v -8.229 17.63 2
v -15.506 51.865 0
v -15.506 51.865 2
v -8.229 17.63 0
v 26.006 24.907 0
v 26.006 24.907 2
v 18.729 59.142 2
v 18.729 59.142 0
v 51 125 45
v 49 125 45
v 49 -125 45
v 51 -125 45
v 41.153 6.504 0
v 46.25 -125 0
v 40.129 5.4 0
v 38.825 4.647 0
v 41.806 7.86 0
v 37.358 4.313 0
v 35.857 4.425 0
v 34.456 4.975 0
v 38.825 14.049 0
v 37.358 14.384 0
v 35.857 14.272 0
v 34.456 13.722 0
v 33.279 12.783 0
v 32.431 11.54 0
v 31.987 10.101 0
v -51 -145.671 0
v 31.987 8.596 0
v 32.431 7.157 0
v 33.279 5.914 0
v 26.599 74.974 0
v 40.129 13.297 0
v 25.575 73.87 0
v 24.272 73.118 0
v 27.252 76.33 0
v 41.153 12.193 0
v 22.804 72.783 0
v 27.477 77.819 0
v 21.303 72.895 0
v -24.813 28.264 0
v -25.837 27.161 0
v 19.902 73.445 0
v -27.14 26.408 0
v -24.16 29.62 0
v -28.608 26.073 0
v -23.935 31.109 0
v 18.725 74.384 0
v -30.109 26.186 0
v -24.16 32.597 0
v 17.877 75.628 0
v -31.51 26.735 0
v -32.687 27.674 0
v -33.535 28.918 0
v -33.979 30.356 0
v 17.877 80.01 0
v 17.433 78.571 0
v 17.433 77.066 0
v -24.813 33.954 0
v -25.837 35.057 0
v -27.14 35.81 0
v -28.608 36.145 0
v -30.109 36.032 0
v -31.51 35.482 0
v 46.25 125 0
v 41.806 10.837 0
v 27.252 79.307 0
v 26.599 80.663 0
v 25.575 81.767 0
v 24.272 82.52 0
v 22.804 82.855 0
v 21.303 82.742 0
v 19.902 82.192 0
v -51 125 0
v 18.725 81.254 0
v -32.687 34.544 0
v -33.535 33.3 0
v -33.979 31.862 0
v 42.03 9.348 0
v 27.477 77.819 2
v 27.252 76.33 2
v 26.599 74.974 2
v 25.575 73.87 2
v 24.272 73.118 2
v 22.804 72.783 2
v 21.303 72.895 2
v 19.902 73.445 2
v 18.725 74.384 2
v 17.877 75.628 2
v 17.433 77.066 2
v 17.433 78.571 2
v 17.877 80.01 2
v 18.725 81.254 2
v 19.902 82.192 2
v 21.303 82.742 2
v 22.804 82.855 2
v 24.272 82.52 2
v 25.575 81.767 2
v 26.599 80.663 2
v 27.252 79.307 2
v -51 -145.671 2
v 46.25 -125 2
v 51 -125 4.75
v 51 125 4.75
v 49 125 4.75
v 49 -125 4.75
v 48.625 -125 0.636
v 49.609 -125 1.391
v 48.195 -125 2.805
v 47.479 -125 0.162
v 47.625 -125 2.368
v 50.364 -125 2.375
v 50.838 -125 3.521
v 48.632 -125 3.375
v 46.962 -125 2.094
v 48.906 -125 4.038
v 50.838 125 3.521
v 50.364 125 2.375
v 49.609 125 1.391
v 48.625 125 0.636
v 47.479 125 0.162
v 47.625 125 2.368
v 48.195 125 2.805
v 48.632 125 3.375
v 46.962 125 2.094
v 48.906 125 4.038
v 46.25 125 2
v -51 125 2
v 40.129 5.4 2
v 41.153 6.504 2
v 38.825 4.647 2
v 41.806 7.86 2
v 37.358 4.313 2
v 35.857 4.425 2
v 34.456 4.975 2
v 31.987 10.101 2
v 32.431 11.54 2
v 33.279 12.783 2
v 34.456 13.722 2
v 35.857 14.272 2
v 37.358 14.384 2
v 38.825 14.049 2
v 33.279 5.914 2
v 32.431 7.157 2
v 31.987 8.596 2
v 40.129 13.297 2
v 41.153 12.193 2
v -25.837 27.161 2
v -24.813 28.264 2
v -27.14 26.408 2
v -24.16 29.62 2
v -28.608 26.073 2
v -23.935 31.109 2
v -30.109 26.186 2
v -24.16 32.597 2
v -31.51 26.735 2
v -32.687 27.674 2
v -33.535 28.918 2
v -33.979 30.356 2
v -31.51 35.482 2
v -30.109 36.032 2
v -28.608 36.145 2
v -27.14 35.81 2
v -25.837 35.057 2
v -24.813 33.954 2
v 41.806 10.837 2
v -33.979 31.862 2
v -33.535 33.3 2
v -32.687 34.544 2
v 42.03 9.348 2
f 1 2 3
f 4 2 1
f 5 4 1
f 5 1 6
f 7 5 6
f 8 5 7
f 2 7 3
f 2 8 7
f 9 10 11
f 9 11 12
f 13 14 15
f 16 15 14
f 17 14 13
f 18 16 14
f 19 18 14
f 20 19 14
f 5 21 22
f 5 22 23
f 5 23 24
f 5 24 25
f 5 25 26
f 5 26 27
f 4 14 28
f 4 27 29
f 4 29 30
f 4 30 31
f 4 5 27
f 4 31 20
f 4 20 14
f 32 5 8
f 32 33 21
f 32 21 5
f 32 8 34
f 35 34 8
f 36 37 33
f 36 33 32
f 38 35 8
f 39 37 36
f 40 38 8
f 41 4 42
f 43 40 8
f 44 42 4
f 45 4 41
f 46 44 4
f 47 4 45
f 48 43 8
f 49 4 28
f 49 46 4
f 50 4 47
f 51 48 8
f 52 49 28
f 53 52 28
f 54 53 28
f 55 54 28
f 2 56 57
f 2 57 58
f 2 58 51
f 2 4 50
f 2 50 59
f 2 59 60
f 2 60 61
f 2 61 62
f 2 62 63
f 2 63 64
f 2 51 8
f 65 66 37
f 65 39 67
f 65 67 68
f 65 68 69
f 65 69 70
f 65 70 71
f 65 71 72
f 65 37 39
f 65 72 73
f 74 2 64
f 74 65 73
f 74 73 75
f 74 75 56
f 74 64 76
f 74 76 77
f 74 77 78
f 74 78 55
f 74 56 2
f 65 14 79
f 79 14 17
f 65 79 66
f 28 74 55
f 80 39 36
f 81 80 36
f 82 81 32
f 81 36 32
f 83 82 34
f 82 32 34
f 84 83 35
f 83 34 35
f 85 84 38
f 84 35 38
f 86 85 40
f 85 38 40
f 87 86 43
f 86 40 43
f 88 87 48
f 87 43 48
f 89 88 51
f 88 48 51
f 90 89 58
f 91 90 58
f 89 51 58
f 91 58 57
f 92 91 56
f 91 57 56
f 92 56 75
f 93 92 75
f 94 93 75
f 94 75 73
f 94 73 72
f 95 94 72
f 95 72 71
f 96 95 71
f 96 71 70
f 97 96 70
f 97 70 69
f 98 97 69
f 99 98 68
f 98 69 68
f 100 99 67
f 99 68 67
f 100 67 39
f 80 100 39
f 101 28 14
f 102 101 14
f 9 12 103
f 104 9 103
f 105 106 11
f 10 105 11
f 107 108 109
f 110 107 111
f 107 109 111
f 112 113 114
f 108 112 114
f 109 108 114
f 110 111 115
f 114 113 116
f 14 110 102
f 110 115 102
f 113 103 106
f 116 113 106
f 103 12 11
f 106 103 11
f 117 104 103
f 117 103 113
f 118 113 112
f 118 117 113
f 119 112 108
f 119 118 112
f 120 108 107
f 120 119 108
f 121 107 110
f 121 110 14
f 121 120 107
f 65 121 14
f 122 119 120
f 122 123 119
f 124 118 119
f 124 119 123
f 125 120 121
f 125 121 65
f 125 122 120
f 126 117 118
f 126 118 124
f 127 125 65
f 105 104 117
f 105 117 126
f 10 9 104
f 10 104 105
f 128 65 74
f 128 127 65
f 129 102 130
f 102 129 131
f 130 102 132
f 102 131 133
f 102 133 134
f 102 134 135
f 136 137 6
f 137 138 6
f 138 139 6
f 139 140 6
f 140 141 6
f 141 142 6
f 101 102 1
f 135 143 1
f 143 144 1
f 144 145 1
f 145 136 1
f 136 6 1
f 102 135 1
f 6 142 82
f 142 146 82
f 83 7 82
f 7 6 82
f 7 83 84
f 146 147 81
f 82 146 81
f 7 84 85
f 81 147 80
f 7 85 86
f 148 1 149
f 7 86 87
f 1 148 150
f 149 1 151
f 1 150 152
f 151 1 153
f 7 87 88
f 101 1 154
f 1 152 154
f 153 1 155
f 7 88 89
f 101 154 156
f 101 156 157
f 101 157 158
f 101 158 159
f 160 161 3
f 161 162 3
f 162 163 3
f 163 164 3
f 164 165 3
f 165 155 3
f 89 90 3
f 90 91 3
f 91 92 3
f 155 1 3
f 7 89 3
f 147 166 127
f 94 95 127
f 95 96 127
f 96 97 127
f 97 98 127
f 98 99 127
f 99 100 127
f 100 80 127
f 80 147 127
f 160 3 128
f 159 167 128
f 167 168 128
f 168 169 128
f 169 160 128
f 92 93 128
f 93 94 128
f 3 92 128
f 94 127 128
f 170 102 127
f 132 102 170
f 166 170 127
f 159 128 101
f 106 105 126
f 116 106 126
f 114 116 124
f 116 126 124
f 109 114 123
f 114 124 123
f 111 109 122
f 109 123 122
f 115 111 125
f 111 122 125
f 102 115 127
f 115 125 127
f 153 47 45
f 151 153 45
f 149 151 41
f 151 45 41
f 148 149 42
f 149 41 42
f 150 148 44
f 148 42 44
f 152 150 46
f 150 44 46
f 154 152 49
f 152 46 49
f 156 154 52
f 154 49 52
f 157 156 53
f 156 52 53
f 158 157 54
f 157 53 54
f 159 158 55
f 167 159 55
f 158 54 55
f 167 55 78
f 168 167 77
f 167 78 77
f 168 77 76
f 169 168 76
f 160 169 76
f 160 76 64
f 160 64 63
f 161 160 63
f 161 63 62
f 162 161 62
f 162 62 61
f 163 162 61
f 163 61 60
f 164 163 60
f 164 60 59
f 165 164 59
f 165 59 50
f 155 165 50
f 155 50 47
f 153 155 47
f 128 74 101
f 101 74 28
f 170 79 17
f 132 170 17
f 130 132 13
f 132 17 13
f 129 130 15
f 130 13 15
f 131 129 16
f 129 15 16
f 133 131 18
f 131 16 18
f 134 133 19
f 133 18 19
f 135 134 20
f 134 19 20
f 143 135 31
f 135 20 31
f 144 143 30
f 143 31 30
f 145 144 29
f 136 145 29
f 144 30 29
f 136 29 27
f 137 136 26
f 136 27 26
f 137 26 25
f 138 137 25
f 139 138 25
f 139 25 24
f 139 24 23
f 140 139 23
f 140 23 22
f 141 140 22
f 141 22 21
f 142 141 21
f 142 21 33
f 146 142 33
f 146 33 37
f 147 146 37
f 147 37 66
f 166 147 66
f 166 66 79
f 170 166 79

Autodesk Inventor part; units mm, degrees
ref_plane "YZ Plane" through (0, 0, 0) normal (1, 0, 0) x (0, 1, 0)
ref_plane "XZ Plane" through (0, 0, 0) normal (0, 1, 0) x (-1, 0, 0)
ref_plane "XY Plane" through (0, 0, 0) normal (0, 0, 1) x (1, 0, 0)
sketch "Sketch1" plane through (0, 0, 0) normal (0, 0, 1) x (1, 0, 0)
  line L0 (-51, 125) -> (51, 125)
  line L1 (51, 125) -> (51, -125)
  line L2 (51, -125) -> (-51, -125)
  line L3 (-51, -125) -> (-51, 125)
  line L4 (-51, 125) -> (51, -125) construction
  point P0 (0, 0)
  point P1 (0, 0)
  dimension "d0" = 102
  dimension "d1" = 250
extrude "Plate1" add sketch "Sketch1" along normal blind 2
sketch "Sketch4" plane through (49, 125, 0) normal (1, 0, 0) x (0, 1, 0)
  line L0 (-250, 0) -> (0, 0)
  line L1 (0, 0) -> (0, 45)
  line L2 (0, 45) -> (-250, 45)
  line L3 (-250, 45) -> (-250, 0)
edge flange "Flange1" height 45 angle 90 thickness 2 bend radius 2.75 thickness toward (1, 0, 0) relief round relief width 2 relief depth 1 edges at (51, 0, 2) wall of the first edge with corners at (49, -125, 0) (49, 125, 0) (49, 125, 45) (49, -125, 45)
bend "Bend1"
corner "Corner1"
sketch "Sketch5" plane through (0, 0, 0) normal (0, 0, -1) x (-1, 0, 0)
  line L0 (-46.25, 125) -> (-46.25, -125) projected
  line L1 (51, -125) -> (-46.25, -125) projected
  line L2 (51, 125) -> (51, -125) projected
  line L3 (-46.25, 125) -> (51, 125) projected
  line L4 (51, -125) -> (51, -145.6711)
  line L5 (-46.25, -125) -> (51, -125) projected
  line L6 (51, -145.6711) -> (-46.25, -125)
  point P0 (0, 0)
  dimension "d25" = 12
extrude "Extrusion2" add sketch "Sketch5" against normal up to surface (2 mm away) contours L1 L4 L6
sketch "Sketch7" plane through (0, 0, 0) normal (0, 0, 1) x (1, 0, 0)
  line L0 (46.25, -125) -> (-51, -145.6711) projected
  circle A0 centre (36.9805, 9.3484) radius 5.05
  line L1 (36.9805, 9.3484) -> (22.4267, 77.8187) construction
  line L2 (26.006, 24.9066) -> (18.7291, 59.1418)
  circle A1 centre (22.4267, 77.8187) radius 5.05
  line L3 (-28.9852, 31.1089) -> (36.9805, 9.3484) construction
  line L4 (26.006, 24.9066) -> (-15.5061, 51.8649) construction
  line L5 (18.7291, 59.1418) -> (-15.5061, 51.8649)
  line L6 (-8.2292, 17.6297) -> (26.006, 24.9066)
  line L7 (18.7291, 59.1418) -> (-8.2292, 17.6297) construction
  line L8 (-15.5061, 51.8649) -> (-8.2292, 17.6297)
  line L9 (22.3675, 42.0242) -> (-28.9852, 31.1089) construction
  line L10 (22.4267, 77.8187) -> (-28.9852, 31.1089) construction
  circle A2 centre (-28.9852, 31.1089) radius 5.05
  point P0 (0, 0)
  point P1 (-47.5274, -178.5141)
  point P2 (5.2499, 38.3858)
  point P3 (-51, -145.6711)
  dimension "d32" = 35
  dimension "d33" = 35
  dimension "d34" = 10.1
  dimension "d35" = 70
  dimension "d36" = 60
  dimension "d37" = 25
extrude "Extrusion3" cut sketch "Sketch7" along normal through all
equation "\"d33\" = d32"
equation "\"d2\" = Thickness"
equation "\"d15\" = BendReliefWidth"
equation "\"d16\" = BendReliefDepth"
equation "\"d17\" = MinimumRemnant"
equation "\"d18\" = TransitionRadius"
equation "\"d21\" = BendRadius"
equation "\"d22\" = CornerReliefSize"
equation "\"d23\" = GapSize"
equation "\"d24\" = JacobiRadiusSize"
equation "\"BendReliefWidth\" = Thickness"
equation "\"BendReliefDepth\" = 0.5 * Thickness"
equation "\"CornerReliefSize\" = 4 * Thickness"
equation "\"MinimumRemnant\" = 2 * Thickness"
equation "\"TransitionRadius\" = BendRadius"
equation "\"JacobiRadiusSize\" = BendRadius"
equation "\"GapSize\" = Thickness"
equation "\"Thickness\" = 2"
equation "\"BendRadius\" = 2.75"
properties part number "MNT-CDF-613 big way" material "Stainless Steel"
